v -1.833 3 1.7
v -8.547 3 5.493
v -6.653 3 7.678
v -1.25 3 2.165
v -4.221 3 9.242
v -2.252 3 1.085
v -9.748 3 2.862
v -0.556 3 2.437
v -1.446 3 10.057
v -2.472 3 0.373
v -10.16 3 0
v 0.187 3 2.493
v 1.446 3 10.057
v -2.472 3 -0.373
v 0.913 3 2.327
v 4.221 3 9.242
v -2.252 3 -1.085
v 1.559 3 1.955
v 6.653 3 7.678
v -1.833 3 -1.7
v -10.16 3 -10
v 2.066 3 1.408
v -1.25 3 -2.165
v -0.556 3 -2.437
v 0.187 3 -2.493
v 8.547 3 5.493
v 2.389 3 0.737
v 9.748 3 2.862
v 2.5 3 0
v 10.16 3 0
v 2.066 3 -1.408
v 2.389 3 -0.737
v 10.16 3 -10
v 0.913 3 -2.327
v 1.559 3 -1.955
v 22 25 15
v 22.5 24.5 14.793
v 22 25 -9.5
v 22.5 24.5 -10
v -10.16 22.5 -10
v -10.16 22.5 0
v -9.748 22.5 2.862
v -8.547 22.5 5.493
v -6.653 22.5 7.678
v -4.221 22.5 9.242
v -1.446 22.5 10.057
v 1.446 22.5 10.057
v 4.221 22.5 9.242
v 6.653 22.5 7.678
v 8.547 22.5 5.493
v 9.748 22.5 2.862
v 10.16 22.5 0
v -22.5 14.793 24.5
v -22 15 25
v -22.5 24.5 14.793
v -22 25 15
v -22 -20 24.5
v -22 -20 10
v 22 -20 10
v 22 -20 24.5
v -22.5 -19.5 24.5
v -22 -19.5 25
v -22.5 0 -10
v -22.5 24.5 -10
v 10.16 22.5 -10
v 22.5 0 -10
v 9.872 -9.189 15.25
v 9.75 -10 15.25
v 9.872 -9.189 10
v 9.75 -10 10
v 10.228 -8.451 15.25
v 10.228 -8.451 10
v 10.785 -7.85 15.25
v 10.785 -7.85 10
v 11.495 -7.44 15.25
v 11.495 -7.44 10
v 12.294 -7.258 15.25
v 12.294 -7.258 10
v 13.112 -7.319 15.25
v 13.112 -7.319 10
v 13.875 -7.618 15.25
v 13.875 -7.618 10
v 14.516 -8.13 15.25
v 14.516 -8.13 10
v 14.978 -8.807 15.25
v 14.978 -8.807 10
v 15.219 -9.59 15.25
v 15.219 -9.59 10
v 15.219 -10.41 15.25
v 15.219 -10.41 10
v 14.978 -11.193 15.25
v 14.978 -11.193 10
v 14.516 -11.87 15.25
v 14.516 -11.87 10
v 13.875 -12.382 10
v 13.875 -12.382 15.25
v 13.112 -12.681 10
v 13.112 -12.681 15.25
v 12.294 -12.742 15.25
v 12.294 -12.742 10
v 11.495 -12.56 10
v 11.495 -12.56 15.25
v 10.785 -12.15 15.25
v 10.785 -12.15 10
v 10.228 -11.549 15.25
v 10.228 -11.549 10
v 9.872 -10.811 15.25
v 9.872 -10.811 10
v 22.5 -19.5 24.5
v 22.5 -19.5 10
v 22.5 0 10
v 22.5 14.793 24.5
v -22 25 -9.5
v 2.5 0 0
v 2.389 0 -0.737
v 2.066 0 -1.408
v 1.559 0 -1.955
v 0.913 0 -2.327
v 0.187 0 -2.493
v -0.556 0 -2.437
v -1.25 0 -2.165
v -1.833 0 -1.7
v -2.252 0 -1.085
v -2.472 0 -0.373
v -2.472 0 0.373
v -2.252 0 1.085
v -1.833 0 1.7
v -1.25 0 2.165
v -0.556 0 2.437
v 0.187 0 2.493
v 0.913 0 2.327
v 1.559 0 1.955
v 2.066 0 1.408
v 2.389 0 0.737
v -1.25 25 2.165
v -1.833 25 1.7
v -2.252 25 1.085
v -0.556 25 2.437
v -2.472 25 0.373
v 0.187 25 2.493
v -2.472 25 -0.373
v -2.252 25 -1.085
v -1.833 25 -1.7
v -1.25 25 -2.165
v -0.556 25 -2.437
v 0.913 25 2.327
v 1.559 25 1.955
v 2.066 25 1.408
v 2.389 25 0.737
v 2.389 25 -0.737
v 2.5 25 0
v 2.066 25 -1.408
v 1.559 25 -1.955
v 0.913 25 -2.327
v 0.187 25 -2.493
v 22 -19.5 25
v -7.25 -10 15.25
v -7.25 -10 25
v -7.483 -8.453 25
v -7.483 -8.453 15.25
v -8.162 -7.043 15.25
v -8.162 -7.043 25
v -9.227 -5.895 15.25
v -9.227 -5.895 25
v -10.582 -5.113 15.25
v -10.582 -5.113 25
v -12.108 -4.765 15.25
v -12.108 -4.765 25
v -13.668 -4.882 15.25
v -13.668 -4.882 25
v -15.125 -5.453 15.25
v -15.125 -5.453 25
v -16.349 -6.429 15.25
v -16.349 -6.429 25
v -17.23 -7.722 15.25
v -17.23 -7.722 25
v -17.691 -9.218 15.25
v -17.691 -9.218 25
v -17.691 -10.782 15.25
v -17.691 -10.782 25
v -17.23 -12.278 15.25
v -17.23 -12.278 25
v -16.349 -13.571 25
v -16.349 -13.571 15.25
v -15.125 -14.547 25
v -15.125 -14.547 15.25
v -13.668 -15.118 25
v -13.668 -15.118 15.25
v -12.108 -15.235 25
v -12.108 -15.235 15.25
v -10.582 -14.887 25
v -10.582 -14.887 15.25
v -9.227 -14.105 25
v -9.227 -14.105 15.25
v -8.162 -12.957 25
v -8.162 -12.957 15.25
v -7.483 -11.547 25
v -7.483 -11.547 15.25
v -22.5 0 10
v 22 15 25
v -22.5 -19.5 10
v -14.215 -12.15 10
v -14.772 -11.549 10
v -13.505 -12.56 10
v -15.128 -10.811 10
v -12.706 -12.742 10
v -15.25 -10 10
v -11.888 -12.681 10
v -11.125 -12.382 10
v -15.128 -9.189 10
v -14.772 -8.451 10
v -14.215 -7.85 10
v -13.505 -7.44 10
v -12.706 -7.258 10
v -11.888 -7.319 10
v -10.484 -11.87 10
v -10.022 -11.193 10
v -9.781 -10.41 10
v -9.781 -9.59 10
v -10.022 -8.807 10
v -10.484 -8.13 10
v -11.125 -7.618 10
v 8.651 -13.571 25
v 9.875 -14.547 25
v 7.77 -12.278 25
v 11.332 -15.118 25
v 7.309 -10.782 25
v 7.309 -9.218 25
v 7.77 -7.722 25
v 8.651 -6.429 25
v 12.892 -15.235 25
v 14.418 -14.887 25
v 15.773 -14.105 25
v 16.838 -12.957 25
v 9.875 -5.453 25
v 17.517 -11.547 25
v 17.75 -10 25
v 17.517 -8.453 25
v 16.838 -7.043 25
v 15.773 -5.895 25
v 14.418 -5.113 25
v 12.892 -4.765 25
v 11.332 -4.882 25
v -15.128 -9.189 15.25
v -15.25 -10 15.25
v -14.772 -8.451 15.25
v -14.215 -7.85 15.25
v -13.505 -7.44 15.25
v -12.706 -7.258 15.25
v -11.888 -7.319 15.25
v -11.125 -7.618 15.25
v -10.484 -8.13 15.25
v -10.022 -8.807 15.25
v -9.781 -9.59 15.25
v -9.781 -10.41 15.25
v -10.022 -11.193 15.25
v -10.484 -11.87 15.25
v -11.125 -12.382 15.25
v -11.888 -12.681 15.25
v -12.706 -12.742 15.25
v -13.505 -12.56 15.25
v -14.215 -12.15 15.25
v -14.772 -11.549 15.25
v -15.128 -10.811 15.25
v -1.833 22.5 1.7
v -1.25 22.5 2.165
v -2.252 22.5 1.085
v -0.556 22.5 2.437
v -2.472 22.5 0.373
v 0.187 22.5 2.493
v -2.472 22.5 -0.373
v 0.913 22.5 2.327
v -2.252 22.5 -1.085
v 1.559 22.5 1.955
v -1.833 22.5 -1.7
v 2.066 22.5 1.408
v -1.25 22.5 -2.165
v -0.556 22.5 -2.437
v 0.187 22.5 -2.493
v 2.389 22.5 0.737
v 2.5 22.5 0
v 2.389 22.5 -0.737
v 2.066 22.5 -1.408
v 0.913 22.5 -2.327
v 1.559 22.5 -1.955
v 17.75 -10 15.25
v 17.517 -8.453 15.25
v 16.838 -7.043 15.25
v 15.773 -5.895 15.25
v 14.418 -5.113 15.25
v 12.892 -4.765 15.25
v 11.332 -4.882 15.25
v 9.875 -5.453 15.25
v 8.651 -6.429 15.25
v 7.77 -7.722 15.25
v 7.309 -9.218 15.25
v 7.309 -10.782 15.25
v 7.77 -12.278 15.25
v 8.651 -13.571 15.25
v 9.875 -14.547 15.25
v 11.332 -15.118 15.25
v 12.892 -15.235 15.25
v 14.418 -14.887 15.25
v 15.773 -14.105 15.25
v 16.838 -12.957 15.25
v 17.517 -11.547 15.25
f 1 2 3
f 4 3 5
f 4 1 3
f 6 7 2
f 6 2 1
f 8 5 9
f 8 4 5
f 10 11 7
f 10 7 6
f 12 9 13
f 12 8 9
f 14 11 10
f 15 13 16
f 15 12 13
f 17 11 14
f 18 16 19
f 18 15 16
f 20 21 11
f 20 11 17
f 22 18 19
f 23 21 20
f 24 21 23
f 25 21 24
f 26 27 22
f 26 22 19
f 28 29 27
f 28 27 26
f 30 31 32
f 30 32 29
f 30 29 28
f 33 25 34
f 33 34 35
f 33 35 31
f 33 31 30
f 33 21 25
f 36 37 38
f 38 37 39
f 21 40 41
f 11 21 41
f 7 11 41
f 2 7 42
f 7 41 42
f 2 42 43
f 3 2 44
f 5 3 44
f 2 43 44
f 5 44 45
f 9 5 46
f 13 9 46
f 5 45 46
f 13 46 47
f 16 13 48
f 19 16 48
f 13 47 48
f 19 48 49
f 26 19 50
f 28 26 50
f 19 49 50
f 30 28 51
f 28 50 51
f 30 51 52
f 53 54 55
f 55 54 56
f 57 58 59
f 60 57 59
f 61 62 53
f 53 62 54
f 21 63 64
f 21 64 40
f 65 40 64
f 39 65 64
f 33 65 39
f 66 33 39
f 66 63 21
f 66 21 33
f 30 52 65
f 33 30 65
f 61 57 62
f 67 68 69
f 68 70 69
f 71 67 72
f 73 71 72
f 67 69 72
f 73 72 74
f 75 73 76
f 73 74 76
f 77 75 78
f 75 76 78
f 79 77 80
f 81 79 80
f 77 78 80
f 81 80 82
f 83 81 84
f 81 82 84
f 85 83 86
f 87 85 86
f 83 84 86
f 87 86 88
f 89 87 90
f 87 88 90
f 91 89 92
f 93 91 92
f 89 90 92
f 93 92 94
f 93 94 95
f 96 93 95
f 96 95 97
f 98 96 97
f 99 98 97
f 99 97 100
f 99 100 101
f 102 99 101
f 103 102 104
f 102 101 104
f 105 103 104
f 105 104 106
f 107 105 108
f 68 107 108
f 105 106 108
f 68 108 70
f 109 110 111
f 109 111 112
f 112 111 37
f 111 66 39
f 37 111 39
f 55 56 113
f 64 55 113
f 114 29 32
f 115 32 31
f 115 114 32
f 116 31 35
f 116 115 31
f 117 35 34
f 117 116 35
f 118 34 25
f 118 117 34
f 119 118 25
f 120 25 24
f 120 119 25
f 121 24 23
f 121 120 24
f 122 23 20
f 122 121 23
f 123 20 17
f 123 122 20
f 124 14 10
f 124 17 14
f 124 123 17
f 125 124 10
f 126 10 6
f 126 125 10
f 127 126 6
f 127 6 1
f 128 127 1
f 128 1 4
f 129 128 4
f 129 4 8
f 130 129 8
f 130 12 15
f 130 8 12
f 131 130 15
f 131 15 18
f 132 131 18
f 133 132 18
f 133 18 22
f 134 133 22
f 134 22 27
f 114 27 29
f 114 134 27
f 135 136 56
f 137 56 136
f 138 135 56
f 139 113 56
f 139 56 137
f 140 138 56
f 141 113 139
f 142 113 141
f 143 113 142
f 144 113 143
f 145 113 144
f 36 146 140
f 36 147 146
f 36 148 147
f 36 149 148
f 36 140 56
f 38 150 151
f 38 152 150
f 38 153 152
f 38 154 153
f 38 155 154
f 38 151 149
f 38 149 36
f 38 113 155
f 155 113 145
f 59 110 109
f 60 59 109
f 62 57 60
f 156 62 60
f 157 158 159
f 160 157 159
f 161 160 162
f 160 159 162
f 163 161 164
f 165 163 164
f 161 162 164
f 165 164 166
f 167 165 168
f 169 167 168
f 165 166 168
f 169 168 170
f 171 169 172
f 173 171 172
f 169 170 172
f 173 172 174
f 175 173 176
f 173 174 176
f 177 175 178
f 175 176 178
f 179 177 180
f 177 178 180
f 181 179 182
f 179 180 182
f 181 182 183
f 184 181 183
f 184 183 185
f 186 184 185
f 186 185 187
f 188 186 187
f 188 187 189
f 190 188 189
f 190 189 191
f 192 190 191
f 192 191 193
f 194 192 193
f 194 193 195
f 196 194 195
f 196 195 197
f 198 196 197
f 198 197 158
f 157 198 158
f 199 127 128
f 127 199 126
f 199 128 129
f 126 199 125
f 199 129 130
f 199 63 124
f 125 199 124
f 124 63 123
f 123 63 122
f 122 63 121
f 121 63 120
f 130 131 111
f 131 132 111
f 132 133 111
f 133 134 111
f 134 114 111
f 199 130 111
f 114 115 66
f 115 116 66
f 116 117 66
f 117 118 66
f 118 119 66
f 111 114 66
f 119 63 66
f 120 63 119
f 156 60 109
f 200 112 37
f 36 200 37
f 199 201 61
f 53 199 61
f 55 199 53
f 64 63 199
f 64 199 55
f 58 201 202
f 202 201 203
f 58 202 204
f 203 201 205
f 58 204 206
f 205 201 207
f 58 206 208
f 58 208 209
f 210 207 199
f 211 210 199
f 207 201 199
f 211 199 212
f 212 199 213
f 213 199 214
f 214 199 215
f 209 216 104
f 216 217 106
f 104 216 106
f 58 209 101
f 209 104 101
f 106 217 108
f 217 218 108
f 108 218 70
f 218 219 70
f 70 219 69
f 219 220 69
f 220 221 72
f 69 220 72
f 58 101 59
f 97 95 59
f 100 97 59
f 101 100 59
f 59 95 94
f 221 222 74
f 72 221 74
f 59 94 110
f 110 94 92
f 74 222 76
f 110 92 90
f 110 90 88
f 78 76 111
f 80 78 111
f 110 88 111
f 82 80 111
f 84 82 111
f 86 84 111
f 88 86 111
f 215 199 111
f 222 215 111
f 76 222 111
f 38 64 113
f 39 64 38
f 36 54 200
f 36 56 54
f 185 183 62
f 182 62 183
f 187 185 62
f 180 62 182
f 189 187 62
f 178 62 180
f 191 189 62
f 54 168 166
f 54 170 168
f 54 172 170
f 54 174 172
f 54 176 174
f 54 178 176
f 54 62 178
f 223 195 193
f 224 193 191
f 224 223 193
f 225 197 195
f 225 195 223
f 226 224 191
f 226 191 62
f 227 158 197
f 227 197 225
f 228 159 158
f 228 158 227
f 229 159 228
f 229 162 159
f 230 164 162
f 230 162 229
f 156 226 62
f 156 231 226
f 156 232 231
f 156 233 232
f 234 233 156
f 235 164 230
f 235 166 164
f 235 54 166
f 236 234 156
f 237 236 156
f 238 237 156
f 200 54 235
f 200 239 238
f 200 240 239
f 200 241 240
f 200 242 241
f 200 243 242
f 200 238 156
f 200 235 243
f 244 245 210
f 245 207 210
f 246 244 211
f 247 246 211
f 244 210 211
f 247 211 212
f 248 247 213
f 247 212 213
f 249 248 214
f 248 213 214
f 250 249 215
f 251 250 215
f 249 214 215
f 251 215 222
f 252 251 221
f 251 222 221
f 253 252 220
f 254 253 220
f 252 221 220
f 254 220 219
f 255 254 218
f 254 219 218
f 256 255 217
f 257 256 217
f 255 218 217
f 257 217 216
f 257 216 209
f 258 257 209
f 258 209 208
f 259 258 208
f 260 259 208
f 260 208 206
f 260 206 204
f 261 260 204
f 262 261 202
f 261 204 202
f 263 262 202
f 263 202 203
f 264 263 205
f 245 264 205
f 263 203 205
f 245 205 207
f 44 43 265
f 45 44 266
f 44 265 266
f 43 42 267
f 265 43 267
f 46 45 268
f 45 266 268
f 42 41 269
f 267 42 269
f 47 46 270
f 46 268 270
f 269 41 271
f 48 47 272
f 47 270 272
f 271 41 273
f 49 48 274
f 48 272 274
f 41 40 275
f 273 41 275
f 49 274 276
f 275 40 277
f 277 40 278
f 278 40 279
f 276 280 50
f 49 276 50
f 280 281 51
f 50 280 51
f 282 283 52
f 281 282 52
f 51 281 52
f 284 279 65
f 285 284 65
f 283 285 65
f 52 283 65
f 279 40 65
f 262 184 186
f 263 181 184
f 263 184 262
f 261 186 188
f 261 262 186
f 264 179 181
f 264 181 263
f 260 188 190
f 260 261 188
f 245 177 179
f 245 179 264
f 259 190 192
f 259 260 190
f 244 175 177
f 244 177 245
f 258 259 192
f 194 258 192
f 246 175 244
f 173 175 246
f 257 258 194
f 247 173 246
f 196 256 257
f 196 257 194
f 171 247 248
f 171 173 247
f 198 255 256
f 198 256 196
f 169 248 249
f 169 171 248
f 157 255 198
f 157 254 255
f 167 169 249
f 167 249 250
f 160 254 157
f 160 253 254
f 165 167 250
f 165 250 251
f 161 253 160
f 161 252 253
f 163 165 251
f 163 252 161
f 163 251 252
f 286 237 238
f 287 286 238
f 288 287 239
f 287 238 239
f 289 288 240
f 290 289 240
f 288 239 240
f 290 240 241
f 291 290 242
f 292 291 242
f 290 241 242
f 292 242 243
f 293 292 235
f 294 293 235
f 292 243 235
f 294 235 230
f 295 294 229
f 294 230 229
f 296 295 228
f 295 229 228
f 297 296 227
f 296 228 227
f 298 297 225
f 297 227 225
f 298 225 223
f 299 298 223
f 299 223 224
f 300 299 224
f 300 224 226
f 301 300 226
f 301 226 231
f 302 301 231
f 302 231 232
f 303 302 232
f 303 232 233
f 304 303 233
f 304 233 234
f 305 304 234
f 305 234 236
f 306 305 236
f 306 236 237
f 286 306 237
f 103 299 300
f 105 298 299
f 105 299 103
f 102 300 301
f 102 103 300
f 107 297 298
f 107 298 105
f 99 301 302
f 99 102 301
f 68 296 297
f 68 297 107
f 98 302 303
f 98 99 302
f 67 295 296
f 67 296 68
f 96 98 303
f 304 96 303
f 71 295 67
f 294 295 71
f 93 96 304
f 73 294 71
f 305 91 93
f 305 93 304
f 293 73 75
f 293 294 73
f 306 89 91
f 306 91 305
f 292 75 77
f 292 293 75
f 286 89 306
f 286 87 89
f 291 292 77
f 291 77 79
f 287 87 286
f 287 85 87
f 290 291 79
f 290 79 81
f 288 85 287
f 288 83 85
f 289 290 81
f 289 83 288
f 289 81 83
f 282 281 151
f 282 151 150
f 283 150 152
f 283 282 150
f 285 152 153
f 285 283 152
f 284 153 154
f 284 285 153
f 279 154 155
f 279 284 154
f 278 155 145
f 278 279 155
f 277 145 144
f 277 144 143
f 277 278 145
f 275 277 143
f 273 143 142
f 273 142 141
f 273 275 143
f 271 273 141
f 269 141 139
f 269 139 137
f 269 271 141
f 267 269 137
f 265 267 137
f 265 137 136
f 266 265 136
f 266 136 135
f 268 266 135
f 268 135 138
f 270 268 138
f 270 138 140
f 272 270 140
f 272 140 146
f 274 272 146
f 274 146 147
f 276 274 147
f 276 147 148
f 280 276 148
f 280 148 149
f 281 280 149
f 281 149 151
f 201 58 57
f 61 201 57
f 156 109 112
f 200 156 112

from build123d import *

# Parameters (mm, degrees)
SKETCH1_W                       = 45
SKETCH1_H                       = 20
SKETCH1_R                       = 2.5
BOSS_EXTRUDE1_DEPTH             = 25
SKETCH9_W                       = 45
SKETCH9_H                       = 45
BOSS_EXTRUDE4_DEPTH             = 15
CUT_EXTRUDE2_START              = -2.5
CUT_EXTRUDE2_DEPTH              = 19.5
CHAMFER1_SIZE                   = 10
CBORE_FOR_M5_SBHCS1_D           = 5.5
CBORE_FOR_M5_SBHCS1_CBORE_D     = 10.5
CBORE_FOR_M5_SBHCS1_CBORE_DEPTH = 9.75
CHAMFER2_SIZE                   = 0.5


with BuildPart() as part:
    # Sketch1 → Boss-Extrude1 (new body)
    with BuildSketch(Plane(origin=(0, 0, 0), x_dir=(1, 0, 0), z_dir=(0, 1, 0))):
        Rectangle(SKETCH1_W, SKETCH1_H)
        Circle(SKETCH1_R, mode=Mode.SUBTRACT)
    extrude(amount=BOSS_EXTRUDE1_DEPTH)

    # Sketch9 → Boss-Extrude4 (add)
    with BuildSketch(Plane.XY.offset(10)):
        with Locations((0, 2.5)):
            Rectangle(SKETCH9_W, SKETCH9_H)
    extrude(amount=BOSS_EXTRUDE4_DEPTH)

    # Sketch10 → Cut-Extrude2 (cut)
    with BuildSketch(Plane(origin=(0, 25, 0), x_dir=(1, 0, 0), z_dir=(0, 1, 0)).offset(CUT_EXTRUDE2_START)):
        with BuildLine():
            Line((10.16, 0), (10.16, 10))
            Line((10.16, 10), (-10.16, 10))
            Line((-10.16, 10), (-10.16, 0))
            ThreePointArc((-10.16, 0), (0, -10.16), (10.16, 0))
        make_face()
    extrude(amount=-CUT_EXTRUDE2_DEPTH, mode=Mode.SUBTRACT)

    # Chamfer1
    chamfer1_edges = [part.edges().sort_by_distance(p)[0] for p in [
        (0, 25, 25),
    ]]
    chamfer(chamfer1_edges, length=CHAMFER1_SIZE)

    # CBORE for M5 SBHCS1 (through all)
    with Locations(Plane.XY.offset(25)):
        with Locations((-12.5, -10), (12.5, -10)):
            CounterBoreHole(CBORE_FOR_M5_SBHCS1_D / 2, CBORE_FOR_M5_SBHCS1_CBORE_D / 2, CBORE_FOR_M5_SBHCS1_CBORE_DEPTH)

    # Chamfer2
    chamfer2_edges = [part.edges().sort_by_distance(p)[0] for p in [
        (-22.5, 25, 2.5),
        (-22.5, -20, 17.5),
        (22.5, -20, 17.5),
        (0, -20, 25),
        (22.5, -2.5, 25),
        (-22.5, -2.5, 25),
        (-22.5, 20, 20),
        (22.5, 25, 2.5),
        (22.5, 20, 20),
        (0, 25, -10),
    ]]
    chamfer(chamfer2_edges, length=CHAMFER2_SIZE)


solid = part.part
